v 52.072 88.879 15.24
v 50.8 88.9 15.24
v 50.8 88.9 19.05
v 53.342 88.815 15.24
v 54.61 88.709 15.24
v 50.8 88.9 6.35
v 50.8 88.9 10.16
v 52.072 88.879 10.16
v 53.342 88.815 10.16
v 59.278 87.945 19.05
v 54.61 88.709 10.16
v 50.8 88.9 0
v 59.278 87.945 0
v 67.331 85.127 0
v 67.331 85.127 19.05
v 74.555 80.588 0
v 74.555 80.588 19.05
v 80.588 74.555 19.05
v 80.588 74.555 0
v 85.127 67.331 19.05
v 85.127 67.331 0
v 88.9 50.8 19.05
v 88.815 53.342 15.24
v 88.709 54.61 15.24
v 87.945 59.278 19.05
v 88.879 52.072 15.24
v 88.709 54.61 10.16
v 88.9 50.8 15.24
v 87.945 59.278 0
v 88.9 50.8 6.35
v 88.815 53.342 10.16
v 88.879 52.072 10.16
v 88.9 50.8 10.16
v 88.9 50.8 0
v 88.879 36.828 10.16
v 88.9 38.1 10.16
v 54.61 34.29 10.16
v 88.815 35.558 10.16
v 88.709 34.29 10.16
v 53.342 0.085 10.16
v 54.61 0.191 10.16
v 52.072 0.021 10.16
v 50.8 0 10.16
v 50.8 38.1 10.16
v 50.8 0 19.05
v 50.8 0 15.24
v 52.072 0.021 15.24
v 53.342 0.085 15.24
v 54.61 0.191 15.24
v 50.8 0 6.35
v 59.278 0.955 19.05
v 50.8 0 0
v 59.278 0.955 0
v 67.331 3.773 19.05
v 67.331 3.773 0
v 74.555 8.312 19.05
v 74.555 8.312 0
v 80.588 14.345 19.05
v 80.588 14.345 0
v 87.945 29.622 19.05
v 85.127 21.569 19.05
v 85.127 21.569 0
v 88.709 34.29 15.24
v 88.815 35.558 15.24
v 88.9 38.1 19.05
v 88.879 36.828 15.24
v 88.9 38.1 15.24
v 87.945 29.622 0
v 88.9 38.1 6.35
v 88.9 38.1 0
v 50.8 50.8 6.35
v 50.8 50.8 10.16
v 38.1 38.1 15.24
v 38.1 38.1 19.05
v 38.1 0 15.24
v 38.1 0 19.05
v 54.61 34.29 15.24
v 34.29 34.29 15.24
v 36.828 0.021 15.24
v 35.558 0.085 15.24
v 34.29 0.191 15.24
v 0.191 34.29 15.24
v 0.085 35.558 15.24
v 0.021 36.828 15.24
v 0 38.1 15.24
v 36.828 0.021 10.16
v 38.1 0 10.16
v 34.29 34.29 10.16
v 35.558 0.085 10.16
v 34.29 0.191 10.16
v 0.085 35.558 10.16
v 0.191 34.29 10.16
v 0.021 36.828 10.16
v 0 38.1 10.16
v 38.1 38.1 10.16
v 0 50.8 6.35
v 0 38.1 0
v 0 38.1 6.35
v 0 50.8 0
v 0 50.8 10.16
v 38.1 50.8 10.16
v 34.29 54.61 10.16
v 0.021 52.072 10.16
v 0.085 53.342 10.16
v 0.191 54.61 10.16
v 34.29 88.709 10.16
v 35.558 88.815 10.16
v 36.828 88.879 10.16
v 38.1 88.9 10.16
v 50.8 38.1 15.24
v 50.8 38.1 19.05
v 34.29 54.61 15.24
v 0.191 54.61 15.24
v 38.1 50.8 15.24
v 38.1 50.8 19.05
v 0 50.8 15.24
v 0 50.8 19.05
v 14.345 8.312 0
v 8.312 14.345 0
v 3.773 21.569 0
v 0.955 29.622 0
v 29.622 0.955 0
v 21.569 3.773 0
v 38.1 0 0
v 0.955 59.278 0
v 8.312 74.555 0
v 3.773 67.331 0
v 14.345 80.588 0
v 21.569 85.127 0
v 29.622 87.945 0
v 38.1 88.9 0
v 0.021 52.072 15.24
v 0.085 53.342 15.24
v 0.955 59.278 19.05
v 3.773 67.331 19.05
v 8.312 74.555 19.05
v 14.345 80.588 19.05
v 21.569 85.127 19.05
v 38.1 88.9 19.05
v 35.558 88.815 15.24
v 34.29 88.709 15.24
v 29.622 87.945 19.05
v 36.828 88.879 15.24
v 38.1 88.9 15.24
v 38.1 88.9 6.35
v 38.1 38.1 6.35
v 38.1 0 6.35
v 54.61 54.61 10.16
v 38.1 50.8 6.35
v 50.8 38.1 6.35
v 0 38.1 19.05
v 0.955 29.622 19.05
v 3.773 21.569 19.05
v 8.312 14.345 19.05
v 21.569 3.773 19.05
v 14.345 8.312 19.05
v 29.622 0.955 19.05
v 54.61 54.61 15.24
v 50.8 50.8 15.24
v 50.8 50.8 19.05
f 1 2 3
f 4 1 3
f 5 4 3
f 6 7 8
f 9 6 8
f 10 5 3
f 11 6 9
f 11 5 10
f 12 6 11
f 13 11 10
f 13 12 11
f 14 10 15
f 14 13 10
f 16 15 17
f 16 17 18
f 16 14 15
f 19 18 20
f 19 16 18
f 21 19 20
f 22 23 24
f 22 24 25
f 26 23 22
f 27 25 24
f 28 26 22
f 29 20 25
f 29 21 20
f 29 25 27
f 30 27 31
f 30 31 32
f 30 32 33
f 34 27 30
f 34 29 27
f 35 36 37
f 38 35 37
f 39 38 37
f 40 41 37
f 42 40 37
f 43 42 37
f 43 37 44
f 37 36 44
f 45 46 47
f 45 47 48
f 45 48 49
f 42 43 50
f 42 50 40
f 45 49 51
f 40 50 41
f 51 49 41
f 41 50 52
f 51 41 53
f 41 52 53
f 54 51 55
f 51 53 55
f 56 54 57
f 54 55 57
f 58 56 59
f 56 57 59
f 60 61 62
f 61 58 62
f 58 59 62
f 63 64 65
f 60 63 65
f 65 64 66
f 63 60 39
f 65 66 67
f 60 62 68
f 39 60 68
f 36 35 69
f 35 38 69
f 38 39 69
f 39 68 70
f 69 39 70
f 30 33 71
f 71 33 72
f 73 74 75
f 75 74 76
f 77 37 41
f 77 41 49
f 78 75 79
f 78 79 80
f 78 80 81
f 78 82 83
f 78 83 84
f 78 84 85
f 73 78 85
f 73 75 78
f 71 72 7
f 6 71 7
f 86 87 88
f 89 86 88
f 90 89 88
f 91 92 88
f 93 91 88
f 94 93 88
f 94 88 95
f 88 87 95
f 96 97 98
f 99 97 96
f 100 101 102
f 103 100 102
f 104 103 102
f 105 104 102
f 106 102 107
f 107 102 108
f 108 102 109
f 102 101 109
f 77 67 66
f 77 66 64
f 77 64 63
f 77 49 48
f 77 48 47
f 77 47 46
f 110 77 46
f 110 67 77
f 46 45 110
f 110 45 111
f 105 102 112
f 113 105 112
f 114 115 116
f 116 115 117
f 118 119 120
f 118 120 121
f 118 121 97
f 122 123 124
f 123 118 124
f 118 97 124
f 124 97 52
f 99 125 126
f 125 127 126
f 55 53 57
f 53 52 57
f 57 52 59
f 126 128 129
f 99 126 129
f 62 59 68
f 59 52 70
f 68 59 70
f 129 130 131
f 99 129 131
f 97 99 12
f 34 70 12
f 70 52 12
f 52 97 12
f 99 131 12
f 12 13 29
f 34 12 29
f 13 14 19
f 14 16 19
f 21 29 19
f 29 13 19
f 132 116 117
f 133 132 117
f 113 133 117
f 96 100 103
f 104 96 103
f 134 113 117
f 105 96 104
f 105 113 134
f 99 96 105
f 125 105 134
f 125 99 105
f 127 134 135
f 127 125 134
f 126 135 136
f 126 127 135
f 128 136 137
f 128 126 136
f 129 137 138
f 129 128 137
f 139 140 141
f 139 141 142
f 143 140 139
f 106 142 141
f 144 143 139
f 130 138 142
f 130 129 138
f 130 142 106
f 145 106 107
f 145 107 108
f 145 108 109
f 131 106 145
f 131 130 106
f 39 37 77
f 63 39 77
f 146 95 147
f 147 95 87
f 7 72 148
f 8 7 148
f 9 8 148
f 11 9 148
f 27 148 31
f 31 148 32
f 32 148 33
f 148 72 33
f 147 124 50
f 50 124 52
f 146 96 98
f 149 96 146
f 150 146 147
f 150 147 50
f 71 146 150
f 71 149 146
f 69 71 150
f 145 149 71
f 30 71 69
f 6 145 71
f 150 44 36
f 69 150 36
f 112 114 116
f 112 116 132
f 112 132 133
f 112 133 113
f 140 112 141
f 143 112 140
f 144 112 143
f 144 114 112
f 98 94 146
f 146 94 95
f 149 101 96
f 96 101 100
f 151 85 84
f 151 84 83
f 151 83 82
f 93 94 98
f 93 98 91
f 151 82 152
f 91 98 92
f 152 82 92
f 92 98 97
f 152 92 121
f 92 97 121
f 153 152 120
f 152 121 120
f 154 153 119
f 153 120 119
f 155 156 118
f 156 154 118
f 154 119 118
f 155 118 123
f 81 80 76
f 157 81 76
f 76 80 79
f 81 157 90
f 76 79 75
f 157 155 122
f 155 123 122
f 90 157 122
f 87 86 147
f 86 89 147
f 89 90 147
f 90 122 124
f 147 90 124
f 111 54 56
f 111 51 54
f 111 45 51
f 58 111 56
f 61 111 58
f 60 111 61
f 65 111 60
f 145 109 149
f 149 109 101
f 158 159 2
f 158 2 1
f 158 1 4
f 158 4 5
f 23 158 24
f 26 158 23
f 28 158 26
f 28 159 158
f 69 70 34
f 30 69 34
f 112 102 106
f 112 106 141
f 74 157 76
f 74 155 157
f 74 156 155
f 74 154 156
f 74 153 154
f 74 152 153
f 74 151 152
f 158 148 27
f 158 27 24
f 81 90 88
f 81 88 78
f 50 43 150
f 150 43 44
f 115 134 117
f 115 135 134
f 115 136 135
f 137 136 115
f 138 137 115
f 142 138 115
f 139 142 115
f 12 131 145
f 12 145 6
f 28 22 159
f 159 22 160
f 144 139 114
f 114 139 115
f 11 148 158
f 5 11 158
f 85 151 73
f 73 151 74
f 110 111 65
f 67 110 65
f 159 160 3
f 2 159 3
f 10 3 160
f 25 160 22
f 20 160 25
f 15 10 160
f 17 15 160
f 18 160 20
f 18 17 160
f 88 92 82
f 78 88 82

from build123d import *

# Parameters (mm, degrees)
F0_W        = 88.9
F0_H        = 88.9
F1_DEPTH    = 19.05
F3_DEPTH    = 12.7
F4_T1_DEPTH = 209.55
F5_W        = 3.81
F5_H        = 5.08
F6_DEPTH    = 38.1
F7_W        = 3.81
F7_H        = 5.08
F8_DEPTH    = 38.1
F9_W        = 3.81
F9_H        = 5.08
F10_DEPTH   = 38.1
F11_W       = 3.81
F11_H       = 5.08
F12_DEPTH   = 38.1
F13_W       = 3.81
F13_H       = 5.08
F14_DEPTH   = 38.1
F15_W       = 3.81
F15_H       = 5.08
F16_DEPTH   = 38.1
F17_W       = 3.81
F17_H       = 5.08
F18_DEPTH   = 38.1
F19_W       = 3.81
F19_H       = 5.08
F20_DEPTH   = 38.1


# Not quite as in the source:
# - a fillet or chamfer that OpenCascade refuses, or shapes differently, is made with other operations: its cross-section is extruded or revolved along the edge and cut away or added


with BuildPart() as f1:
    # F0 (on Top) → F1 (new body)
    with BuildSketch(Plane.XY):
        with Locations((44.45, 44.45)):
            Rectangle(F0_W, F0_H)
    extrude(amount=F1_DEPTH)

    # F2 (on face) → F3 (cut)
    with BuildSketch(Plane.XY.offset(19.05)):
        Polygon((38.1, 50.8), (0, 50.8), (0, 38.1), (38.1, 38.1), (38.1, 0), (50.8, 0), (50.8, 38.1), (88.9, 38.1), (88.9, 50.8), (50.8, 50.8), (50.8, 88.9), (38.1, 88.9), align=None)
    extrude(amount=-F3_DEPTH, mode=Mode.SUBTRACT)

    # F4: fillet of radius 38.1 on 4 edges, made by hand

    # F4_s2 → F4_t1 (cut)
    with BuildSketch(Plane.XY.offset(-95.25)):
        with BuildLine():
            ThreePointArc((50.8, 0), (77.7407683632, 11.1592316368), (88.9, 38.1))
            Line((88.9, 38.1), (88.9, 0))
            Line((88.9, 0), (50.8, 0))
        make_face()
        with BuildLine():
            ThreePointArc((0, 38.1), (11.1592316368, 11.1592316368), (38.1, 0))
            Line((38.1, 0), (0, 0))
            Line((0, 0), (0, 38.1))
        make_face()
        with BuildLine():
            ThreePointArc((50.8, 88.9), (77.7407683632, 77.7407683632), (88.9, 50.8))
            Line((88.9, 50.8), (88.9, 88.9))
            Line((88.9, 88.9), (50.8, 88.9))
        make_face()
        with BuildLine():
            ThreePointArc((0, 50.8), (11.1592316368, 77.7407683632), (38.1, 88.9))
            Line((38.1, 88.9), (0, 88.9))
            Line((0, 88.9), (0, 50.8))
        make_face()
    extrude(amount=F4_T1_DEPTH, mode=Mode.SUBTRACT)

    # F5 (on face) → F6 (cut)
    with BuildSketch(Plane(origin=(0, 38.1, 0), x_dir=(-1, 0, 0), z_dir=(0, 1, 0))):
        with Locations((-52.705, 12.7)):
            Rectangle(F5_W, F5_H)
    extrude(amount=-F6_DEPTH, mode=Mode.SUBTRACT)

    # F7 (on face) → F8 (cut)
    with BuildSketch(Plane.XZ.offset(-50.8)):
        with Locations((52.705, 12.7)):
            Rectangle(F7_W, F7_H)
    extrude(amount=-F8_DEPTH, mode=Mode.SUBTRACT)

    # F9 (on face) → F10 (cut)
    with BuildSketch(Plane.YZ.offset(38.1)):
        with Locations((36.195, 12.7)):
            Rectangle(F9_W, F9_H)
    extrude(amount=-F10_DEPTH, mode=Mode.SUBTRACT)

    # F11 (on face) → F12 (cut)
    with BuildSketch(Plane(origin=(54.61, 0, 0), x_dir=(0, -1, 0), z_dir=(-1, 0, 0))):
        with Locations((-36.195, 12.7)):
            Rectangle(F11_W, F11_H)
    extrude(amount=-F12_DEPTH, mode=Mode.SUBTRACT)

    # F13 (on face) → F14 (cut)
    with BuildSketch(Plane.YZ.offset(38.1)):
        with Locations((52.705, 12.7)):
            Rectangle(F13_W, F13_H)
    extrude(amount=-F14_DEPTH, mode=Mode.SUBTRACT)

    # F15 (on face) → F16 (cut)
    with BuildSketch(Plane(origin=(54.61, 0, 0), x_dir=(0, -1, 0), z_dir=(-1, 0, 0))):
        with Locations((-52.705, 12.7)):
            Rectangle(F15_W, F15_H)
    extrude(amount=-F16_DEPTH, mode=Mode.SUBTRACT)

    # F17 (on face) → F18 (cut)
    with BuildSketch(Plane.XZ.offset(-54.61)):
        with Locations((36.195, 12.7)):
            Rectangle(F17_W, F17_H)
    extrude(amount=-F18_DEPTH, mode=Mode.SUBTRACT)

    # F19 (on face) → F20 (cut)
    with BuildSketch(Plane(origin=(0, 34.29, 0), x_dir=(-1, 0, 0), z_dir=(0, 1, 0))):
        with Locations((-36.195, 12.7)):
            Rectangle(F19_W, F19_H)
    extrude(amount=-F20_DEPTH, mode=Mode.SUBTRACT)


solid = f1.part
